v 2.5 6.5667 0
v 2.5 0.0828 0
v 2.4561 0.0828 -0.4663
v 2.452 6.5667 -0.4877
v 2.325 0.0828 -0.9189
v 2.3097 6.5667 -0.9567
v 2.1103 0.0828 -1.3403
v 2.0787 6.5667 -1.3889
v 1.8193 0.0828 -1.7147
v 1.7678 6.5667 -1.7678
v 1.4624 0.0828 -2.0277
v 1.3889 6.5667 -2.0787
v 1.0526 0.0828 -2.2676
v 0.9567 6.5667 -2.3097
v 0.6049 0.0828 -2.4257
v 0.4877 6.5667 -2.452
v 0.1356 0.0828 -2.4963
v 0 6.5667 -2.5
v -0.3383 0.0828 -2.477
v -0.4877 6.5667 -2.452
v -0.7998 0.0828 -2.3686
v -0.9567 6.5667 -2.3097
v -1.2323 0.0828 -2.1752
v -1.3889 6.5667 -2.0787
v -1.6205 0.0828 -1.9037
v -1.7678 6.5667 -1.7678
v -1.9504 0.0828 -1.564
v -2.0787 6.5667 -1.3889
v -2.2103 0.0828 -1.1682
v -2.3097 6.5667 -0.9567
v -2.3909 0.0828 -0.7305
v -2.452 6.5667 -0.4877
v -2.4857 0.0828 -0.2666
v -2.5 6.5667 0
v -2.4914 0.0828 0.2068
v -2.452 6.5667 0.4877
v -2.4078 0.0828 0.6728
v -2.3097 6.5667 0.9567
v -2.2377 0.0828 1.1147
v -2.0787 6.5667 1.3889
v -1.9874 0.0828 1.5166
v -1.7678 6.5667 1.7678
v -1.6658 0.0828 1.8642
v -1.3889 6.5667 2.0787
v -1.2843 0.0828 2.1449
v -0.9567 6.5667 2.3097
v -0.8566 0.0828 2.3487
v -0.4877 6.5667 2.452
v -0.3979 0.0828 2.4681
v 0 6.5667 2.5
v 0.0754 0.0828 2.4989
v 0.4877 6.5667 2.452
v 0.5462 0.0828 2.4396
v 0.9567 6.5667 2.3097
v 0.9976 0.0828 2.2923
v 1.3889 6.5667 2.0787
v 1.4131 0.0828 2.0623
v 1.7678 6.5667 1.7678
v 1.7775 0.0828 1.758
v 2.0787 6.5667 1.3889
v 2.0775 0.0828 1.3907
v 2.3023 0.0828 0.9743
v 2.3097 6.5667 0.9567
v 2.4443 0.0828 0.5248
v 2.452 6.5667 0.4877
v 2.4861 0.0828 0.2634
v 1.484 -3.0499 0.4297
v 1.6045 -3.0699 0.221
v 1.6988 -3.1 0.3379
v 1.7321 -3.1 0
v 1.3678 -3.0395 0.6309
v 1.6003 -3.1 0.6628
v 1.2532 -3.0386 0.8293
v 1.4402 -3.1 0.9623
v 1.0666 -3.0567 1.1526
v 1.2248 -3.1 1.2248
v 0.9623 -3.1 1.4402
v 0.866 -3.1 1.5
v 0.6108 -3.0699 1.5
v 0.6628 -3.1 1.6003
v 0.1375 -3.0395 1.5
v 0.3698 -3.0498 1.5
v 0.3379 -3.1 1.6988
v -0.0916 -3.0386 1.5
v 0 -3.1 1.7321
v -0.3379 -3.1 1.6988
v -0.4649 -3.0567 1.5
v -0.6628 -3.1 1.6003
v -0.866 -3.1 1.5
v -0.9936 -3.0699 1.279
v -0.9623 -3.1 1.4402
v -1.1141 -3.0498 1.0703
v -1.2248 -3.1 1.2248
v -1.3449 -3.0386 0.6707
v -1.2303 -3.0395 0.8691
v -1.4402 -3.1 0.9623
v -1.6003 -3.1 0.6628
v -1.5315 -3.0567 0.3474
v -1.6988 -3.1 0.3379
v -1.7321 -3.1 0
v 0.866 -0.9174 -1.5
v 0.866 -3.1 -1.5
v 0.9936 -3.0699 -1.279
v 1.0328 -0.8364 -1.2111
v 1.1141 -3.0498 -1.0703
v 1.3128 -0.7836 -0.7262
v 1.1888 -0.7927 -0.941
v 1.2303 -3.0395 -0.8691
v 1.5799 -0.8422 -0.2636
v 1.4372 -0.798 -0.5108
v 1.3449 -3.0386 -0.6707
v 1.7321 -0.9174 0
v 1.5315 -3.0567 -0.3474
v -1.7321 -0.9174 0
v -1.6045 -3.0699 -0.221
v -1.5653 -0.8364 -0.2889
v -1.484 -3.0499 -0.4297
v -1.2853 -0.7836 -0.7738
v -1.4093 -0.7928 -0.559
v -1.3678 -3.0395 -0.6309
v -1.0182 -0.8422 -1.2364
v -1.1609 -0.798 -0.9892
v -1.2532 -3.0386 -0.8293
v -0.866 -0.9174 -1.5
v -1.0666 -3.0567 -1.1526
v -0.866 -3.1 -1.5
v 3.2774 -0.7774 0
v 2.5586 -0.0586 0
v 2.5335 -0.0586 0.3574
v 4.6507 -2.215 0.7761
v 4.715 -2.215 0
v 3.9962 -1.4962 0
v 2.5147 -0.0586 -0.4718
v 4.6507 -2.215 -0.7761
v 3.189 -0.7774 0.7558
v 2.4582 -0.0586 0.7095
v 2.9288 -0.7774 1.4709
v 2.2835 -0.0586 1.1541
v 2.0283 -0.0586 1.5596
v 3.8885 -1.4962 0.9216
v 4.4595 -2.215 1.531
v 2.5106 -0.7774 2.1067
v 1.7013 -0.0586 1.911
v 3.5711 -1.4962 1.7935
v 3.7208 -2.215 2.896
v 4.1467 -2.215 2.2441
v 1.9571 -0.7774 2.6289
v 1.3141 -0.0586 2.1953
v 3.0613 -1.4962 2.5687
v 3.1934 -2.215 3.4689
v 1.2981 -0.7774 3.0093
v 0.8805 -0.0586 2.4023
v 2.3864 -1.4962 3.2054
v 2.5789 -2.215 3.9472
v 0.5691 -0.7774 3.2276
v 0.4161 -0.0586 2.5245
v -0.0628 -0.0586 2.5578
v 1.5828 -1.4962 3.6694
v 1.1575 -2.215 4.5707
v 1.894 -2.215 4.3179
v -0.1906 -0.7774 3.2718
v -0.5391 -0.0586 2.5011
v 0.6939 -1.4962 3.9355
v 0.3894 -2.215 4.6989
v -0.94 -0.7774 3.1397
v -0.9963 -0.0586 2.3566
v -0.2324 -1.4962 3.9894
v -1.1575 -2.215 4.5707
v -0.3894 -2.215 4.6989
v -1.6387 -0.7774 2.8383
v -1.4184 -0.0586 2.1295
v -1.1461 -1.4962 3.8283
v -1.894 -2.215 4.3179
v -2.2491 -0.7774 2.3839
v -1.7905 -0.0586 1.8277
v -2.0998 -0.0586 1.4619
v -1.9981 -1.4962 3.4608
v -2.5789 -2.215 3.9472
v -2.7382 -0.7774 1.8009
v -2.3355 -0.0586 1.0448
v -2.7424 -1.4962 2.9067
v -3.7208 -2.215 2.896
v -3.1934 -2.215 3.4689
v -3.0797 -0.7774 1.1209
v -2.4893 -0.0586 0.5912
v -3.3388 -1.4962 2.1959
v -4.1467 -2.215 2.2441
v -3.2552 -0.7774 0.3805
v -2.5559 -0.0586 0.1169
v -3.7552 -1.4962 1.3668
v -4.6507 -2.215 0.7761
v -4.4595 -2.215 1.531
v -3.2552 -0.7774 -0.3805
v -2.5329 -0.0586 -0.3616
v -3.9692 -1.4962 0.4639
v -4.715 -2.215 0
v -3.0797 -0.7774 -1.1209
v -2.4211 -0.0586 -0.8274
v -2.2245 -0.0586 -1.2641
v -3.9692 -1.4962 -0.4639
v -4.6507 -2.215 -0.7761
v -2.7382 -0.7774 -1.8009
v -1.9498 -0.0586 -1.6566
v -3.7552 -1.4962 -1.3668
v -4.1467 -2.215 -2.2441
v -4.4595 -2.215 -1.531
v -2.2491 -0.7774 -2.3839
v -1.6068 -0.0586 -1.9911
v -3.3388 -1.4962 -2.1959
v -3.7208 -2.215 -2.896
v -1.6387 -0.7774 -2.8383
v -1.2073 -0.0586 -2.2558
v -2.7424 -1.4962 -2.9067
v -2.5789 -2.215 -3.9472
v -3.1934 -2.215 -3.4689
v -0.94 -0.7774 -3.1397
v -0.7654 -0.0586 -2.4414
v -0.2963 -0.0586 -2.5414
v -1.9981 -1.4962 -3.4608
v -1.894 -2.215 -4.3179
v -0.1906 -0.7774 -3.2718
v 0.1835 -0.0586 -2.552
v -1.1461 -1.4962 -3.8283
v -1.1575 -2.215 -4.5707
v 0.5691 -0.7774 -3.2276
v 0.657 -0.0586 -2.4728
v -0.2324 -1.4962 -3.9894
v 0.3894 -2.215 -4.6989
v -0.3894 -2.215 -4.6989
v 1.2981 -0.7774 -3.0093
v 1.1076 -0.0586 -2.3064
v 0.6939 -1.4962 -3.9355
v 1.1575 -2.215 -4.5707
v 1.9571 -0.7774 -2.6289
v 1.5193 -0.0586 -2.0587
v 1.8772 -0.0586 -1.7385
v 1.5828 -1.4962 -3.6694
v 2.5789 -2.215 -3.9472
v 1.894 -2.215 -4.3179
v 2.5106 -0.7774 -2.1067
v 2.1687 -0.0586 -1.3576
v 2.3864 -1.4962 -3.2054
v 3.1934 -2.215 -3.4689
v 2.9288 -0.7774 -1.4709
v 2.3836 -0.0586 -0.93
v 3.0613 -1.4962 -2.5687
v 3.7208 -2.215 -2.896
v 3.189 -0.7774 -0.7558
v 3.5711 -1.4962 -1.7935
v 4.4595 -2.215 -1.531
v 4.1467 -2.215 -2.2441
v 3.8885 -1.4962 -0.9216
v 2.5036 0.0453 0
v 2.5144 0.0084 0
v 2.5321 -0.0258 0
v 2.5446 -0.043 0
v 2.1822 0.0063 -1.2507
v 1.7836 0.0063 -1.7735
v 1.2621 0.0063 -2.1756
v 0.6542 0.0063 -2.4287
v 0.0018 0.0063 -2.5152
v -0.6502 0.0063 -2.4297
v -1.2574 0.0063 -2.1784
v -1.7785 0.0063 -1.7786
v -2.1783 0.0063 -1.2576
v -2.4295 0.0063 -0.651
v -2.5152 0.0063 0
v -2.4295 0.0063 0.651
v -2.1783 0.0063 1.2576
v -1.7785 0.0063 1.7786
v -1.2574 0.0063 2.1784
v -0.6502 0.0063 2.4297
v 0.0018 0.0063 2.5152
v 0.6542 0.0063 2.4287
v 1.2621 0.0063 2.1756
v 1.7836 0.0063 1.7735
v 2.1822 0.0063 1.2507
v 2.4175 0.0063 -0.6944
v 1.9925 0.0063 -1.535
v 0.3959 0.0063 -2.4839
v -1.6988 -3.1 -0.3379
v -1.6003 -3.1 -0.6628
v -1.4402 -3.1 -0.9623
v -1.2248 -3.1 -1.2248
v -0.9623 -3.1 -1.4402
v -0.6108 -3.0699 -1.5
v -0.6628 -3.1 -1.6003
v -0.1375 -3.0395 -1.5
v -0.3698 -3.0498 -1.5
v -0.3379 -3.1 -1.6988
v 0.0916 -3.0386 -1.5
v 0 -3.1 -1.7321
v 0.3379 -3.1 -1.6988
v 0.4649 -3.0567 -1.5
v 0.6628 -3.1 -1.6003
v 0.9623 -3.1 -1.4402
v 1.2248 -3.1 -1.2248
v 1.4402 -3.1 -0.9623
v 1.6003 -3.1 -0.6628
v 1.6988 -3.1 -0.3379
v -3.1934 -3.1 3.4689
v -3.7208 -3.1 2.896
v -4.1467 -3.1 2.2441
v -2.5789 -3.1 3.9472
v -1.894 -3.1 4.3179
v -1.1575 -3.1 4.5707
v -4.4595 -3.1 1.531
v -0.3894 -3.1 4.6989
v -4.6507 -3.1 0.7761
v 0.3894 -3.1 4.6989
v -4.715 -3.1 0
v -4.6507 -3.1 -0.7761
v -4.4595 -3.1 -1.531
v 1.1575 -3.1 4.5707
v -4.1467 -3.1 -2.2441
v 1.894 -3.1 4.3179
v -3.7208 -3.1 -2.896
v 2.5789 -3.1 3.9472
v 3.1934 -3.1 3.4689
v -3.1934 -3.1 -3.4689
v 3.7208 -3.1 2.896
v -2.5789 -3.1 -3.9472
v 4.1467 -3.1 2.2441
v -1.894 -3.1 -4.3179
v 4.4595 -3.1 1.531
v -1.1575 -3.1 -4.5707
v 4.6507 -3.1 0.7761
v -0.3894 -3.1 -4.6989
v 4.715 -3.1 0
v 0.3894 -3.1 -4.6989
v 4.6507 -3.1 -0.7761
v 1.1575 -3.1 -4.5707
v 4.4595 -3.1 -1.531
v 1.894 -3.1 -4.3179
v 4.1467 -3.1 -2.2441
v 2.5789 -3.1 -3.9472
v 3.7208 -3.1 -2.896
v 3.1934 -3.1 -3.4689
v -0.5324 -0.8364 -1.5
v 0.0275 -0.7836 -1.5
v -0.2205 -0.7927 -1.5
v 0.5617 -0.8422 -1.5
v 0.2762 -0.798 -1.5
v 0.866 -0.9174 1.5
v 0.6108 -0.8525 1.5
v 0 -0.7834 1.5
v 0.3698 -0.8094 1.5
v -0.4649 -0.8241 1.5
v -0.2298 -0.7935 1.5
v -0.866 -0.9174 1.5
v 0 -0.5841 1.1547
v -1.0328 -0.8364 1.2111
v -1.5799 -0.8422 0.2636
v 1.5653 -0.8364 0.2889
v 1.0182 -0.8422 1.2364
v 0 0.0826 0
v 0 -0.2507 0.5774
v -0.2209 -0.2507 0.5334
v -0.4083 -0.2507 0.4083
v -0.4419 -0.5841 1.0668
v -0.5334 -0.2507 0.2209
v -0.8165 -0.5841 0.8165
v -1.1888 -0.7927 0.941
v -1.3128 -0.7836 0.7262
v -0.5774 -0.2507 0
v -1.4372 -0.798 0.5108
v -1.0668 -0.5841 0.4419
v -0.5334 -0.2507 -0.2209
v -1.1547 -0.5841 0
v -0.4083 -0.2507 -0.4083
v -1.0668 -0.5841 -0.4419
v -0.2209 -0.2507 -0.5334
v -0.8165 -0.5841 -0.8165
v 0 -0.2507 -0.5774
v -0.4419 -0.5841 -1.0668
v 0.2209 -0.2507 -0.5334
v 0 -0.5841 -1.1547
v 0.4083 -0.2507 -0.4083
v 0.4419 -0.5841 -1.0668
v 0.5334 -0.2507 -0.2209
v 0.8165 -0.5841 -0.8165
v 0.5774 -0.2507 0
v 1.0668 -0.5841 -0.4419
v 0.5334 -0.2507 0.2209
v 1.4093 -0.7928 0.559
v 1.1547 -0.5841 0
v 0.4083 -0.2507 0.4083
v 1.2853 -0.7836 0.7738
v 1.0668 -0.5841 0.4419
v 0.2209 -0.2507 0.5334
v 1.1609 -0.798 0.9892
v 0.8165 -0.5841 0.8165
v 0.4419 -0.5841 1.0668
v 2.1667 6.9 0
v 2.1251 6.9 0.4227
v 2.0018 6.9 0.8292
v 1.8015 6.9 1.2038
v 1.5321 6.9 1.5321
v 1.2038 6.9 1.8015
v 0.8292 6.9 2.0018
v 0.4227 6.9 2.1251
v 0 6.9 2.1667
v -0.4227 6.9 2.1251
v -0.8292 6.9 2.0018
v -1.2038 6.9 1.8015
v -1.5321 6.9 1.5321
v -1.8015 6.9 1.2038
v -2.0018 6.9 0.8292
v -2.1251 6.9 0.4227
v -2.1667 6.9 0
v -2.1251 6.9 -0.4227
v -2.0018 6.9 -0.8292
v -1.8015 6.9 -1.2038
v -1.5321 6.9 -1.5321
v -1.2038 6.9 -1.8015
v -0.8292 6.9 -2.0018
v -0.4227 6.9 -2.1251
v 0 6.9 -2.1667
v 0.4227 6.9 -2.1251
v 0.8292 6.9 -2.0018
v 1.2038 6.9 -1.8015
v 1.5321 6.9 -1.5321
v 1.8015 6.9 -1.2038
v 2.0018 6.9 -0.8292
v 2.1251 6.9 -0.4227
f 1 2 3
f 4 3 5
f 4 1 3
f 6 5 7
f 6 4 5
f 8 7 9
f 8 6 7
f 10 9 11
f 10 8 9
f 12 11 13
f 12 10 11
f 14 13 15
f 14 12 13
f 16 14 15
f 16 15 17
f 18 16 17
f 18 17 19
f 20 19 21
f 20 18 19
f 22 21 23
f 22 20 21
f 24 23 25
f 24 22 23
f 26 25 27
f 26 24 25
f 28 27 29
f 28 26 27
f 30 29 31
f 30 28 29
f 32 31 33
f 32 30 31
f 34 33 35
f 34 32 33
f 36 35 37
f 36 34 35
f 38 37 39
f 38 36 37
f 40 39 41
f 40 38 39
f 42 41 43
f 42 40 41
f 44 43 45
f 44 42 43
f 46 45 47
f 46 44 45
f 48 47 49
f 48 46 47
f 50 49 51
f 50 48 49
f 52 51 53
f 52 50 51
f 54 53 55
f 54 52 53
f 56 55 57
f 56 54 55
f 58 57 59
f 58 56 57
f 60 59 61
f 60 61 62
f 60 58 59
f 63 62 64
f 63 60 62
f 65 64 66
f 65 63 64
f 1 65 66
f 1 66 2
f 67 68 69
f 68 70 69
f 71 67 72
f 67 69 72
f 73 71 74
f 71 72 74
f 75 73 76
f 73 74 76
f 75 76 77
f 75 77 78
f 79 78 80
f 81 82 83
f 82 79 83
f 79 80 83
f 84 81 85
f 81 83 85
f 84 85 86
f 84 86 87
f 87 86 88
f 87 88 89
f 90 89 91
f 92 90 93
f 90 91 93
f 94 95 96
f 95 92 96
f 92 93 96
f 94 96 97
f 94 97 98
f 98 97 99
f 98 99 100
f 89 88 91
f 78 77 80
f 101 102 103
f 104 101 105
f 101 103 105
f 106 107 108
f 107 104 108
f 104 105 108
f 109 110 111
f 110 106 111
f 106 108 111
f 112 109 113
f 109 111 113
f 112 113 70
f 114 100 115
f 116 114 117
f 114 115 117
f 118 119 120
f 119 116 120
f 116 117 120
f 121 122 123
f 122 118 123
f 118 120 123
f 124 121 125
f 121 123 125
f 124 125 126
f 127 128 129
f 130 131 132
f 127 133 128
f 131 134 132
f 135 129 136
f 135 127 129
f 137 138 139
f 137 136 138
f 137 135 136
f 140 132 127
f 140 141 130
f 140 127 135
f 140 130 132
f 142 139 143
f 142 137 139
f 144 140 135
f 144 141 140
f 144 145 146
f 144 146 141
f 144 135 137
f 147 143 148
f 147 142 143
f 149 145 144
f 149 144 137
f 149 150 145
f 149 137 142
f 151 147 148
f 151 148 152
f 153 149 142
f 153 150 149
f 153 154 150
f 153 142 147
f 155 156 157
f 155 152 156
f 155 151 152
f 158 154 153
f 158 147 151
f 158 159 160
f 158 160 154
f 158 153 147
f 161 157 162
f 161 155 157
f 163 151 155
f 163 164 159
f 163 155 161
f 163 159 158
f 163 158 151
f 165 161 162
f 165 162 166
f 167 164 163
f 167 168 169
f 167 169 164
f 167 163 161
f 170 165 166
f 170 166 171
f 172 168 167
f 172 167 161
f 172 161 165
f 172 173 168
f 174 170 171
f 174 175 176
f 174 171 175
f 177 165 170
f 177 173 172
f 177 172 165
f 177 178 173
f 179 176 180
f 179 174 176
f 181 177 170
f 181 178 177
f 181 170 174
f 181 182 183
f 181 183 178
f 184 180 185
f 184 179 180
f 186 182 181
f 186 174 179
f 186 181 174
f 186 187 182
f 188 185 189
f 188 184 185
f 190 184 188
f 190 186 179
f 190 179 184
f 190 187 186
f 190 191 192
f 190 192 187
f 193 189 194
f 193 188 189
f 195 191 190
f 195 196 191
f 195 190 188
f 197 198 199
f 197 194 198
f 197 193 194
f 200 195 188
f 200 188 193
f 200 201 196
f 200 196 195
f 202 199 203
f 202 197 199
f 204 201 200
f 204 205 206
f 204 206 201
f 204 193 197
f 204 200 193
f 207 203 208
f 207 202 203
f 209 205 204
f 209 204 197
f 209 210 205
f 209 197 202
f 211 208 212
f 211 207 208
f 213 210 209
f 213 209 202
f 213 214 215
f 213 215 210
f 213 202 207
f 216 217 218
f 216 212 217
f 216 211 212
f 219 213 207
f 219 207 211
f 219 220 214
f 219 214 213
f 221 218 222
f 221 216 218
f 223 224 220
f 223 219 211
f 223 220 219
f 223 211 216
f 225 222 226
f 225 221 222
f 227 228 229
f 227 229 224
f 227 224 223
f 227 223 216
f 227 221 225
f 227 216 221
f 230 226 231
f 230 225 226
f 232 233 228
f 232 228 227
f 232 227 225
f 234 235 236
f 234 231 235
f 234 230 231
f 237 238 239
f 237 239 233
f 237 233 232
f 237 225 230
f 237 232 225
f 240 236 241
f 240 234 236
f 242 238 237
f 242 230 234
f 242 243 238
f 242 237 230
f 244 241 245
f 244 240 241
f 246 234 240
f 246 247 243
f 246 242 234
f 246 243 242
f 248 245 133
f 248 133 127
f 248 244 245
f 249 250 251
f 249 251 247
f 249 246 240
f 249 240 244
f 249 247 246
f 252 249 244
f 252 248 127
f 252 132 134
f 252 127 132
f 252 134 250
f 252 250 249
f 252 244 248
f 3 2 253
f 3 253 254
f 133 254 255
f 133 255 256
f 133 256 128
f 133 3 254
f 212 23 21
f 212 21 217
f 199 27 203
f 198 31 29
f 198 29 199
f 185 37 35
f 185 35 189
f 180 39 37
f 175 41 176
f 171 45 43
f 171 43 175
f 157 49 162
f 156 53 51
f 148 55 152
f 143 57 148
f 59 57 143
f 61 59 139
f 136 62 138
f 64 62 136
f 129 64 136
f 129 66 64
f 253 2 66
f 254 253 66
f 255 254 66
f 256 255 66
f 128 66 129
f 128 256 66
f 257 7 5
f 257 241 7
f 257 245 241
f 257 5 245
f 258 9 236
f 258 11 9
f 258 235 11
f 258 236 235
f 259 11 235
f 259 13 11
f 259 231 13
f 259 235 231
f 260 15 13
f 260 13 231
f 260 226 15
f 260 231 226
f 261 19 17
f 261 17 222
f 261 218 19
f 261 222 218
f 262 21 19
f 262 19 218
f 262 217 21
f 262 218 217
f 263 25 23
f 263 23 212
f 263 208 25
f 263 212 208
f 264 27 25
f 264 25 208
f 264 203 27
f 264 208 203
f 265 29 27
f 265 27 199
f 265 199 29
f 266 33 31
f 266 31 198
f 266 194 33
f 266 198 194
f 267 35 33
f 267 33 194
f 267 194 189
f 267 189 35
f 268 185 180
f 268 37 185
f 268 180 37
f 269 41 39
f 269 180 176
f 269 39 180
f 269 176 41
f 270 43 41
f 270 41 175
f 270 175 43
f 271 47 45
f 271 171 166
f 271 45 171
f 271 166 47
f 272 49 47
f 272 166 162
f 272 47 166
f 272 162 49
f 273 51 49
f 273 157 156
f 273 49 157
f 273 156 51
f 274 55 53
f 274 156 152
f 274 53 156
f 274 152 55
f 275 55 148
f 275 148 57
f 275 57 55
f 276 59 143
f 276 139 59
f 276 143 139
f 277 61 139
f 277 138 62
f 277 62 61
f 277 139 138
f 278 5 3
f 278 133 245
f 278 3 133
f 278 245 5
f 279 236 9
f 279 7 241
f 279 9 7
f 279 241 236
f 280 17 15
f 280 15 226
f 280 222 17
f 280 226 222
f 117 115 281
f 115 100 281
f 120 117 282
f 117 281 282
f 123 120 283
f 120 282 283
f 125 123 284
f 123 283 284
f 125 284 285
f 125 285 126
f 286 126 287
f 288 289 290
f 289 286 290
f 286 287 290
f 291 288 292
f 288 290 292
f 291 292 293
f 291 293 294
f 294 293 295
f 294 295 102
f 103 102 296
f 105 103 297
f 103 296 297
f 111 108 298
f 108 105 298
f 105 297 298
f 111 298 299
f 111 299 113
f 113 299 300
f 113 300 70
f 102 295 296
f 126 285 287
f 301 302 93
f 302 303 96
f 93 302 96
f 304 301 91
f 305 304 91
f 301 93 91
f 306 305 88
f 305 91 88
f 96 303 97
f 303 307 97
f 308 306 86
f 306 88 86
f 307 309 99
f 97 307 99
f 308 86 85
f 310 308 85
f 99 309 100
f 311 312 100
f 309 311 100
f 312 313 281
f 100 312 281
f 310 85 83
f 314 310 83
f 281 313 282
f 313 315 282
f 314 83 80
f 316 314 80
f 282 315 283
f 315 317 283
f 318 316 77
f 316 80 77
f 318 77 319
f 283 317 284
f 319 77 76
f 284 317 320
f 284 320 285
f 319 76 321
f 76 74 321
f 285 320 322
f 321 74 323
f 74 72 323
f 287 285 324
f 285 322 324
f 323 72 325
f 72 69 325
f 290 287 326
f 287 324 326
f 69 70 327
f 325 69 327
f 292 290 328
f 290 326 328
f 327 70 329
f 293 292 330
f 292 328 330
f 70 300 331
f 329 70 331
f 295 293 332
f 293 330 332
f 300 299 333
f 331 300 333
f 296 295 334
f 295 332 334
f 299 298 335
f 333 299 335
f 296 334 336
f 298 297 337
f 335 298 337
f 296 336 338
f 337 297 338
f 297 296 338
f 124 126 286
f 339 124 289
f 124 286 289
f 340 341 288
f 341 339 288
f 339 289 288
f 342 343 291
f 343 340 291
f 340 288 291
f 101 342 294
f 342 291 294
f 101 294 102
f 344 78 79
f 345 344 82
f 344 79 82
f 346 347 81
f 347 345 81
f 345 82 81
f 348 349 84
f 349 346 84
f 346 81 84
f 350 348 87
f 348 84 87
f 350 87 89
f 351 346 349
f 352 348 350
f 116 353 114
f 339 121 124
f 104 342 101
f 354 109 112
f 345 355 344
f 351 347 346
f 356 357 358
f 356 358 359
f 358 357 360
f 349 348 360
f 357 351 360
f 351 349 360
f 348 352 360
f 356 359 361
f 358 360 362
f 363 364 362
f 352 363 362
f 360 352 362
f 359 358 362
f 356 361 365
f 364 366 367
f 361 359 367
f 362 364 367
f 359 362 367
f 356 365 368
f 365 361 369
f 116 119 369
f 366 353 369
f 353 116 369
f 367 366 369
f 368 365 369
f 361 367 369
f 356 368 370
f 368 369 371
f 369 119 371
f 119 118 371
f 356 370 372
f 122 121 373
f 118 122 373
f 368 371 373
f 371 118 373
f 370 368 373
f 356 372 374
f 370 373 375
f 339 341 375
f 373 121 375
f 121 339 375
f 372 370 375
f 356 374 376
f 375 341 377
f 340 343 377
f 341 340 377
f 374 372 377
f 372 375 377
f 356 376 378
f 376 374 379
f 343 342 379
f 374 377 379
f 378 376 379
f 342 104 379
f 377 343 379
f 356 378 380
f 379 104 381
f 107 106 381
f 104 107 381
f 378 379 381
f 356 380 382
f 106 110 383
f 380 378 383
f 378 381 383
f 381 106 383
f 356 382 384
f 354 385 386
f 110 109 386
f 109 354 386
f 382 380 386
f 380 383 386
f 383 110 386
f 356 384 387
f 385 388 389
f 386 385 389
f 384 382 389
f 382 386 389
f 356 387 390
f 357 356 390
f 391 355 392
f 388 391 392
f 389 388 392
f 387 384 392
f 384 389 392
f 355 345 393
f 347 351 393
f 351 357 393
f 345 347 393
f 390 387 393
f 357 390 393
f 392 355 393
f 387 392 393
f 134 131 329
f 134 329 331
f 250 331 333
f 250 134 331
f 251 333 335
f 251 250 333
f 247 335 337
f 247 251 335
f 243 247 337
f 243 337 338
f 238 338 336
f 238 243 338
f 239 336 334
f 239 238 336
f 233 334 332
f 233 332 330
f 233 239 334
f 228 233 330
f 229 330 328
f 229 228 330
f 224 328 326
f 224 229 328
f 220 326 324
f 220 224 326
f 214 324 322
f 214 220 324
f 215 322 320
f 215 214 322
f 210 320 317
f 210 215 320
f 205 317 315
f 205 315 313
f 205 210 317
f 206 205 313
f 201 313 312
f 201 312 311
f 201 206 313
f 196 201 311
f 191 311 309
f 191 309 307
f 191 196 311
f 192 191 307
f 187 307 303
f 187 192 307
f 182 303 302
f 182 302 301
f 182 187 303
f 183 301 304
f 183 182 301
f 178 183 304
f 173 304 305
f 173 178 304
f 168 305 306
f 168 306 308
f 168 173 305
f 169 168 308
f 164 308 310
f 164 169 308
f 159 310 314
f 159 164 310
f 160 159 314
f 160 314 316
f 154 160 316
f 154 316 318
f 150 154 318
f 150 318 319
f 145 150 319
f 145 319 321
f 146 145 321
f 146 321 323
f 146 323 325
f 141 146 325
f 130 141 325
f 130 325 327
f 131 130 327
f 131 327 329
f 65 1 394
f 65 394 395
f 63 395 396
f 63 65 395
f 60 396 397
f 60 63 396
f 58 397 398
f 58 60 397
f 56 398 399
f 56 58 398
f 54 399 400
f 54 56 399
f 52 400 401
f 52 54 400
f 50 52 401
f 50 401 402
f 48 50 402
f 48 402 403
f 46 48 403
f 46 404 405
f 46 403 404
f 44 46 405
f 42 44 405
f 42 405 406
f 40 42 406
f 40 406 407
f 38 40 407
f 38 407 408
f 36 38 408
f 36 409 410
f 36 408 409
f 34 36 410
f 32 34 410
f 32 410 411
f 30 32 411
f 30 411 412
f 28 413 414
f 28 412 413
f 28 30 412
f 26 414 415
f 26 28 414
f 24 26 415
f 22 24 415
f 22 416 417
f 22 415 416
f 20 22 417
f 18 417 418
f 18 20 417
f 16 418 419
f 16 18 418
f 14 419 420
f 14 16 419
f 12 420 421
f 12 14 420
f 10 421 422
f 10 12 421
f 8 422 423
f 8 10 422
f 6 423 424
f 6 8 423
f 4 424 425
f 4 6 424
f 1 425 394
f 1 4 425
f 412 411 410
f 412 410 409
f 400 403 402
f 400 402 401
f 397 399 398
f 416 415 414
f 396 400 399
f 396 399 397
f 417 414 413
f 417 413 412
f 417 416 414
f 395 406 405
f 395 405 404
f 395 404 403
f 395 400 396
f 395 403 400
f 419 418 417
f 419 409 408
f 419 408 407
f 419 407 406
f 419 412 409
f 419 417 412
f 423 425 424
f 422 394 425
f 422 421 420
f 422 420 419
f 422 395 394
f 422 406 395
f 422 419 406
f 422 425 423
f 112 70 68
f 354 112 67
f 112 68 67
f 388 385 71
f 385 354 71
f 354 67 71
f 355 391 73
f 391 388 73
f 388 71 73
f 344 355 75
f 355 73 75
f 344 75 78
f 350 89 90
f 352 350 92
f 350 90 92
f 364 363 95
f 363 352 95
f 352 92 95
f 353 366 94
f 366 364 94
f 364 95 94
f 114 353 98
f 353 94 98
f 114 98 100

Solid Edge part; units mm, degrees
sketch "Sketch1" plane through (0, 0, 0) normal (0, 0, 1) x (1, 0, 0)
  line L0 (2.5, 0) -> (2.5, 6.9)
  line L1 (0, 6.9) -> (2.5, 6.9)
  line L2 (0, 0) -> (0, 6.9)
  line L3 (0, 0) -> (0, -3.1)
  line L4 (0, -3.1) -> (4.715, -3.1)
  line L5 (4.715, -3.1) -> (4.715, -2.215)
  line L6 (4.715, -2.215) -> (2.5, 0)
revolve "RevolvedProtrusion1" add sketch "Sketch1" angle 360 about axis through (0, 0, 0) along (0, 1, 0)
sketch "Sketch2" plane through (0, 0, 0) normal (1, 0, 0) x (0, 1, 0)
  line L0 (-3.1, 2.2215) -> (-1.2, 2.2215)
  line L1 (0.0826, 0) -> (-1.2, 2.2215)
  line L2 (-3.1, 0) -> (0.0826, 0)
  line L3 (-3.1, 0) -> (-3.1, 2.2215)
revolve "RevolvedCutout1" cut sketch "Sketch2" angle 360 about axis through (0, -4.5, 0) along (0, 1, 0)
sketch "Sketch3" plane through (0, -3.1, 0) normal (0, -1, 0) x (0, 0, 1)
  circle A0 centre (0, 0) radius 2.2215
  line L0 (-1.5, -0.866) -> (0, -1.7321)
  line L1 (0, -1.7321) -> (1.5, -0.866)
  line L2 (1.5, -0.866) -> (1.5, 0.866)
  line L3 (1.5, 0.866) -> (0, 1.7321)
  line L4 (0, 1.7321) -> (-1.5, 0.866)
  line L5 (-1.5, 0.866) -> (-1.5, -0.866)
  dimension "D1" = 3
extrude "Protrusion1" add sketch "Sketch3" against normal up to next
sketch "Sketch4" plane through (0, 0, 0) normal (0, 0, 1) x (1, 0, 0)
  line L0 (-1.7321, -3.1) -> (0, -3.1)
  line L1 (0, -3.1) -> (0, -2.6359)
  line L2 (0, -2.6359) -> (-1.7321, -3.1)
revolve "RevolvedCutout2" cut sketch "Sketch4" angle 360 about axis through (0, -4.5, 0) along (0, 1, 0)
fillet "Round1" radius 0.2 1 edges at (0, 0, -2.5)
chamfer "倒斜角_2" distance 0.3333 angle 45 1 edges at (0, 6.9, -2.5)
cosmetic_thread "Thread1" size "M5"
properties part number "N2611-0314" material "铝 1060"
